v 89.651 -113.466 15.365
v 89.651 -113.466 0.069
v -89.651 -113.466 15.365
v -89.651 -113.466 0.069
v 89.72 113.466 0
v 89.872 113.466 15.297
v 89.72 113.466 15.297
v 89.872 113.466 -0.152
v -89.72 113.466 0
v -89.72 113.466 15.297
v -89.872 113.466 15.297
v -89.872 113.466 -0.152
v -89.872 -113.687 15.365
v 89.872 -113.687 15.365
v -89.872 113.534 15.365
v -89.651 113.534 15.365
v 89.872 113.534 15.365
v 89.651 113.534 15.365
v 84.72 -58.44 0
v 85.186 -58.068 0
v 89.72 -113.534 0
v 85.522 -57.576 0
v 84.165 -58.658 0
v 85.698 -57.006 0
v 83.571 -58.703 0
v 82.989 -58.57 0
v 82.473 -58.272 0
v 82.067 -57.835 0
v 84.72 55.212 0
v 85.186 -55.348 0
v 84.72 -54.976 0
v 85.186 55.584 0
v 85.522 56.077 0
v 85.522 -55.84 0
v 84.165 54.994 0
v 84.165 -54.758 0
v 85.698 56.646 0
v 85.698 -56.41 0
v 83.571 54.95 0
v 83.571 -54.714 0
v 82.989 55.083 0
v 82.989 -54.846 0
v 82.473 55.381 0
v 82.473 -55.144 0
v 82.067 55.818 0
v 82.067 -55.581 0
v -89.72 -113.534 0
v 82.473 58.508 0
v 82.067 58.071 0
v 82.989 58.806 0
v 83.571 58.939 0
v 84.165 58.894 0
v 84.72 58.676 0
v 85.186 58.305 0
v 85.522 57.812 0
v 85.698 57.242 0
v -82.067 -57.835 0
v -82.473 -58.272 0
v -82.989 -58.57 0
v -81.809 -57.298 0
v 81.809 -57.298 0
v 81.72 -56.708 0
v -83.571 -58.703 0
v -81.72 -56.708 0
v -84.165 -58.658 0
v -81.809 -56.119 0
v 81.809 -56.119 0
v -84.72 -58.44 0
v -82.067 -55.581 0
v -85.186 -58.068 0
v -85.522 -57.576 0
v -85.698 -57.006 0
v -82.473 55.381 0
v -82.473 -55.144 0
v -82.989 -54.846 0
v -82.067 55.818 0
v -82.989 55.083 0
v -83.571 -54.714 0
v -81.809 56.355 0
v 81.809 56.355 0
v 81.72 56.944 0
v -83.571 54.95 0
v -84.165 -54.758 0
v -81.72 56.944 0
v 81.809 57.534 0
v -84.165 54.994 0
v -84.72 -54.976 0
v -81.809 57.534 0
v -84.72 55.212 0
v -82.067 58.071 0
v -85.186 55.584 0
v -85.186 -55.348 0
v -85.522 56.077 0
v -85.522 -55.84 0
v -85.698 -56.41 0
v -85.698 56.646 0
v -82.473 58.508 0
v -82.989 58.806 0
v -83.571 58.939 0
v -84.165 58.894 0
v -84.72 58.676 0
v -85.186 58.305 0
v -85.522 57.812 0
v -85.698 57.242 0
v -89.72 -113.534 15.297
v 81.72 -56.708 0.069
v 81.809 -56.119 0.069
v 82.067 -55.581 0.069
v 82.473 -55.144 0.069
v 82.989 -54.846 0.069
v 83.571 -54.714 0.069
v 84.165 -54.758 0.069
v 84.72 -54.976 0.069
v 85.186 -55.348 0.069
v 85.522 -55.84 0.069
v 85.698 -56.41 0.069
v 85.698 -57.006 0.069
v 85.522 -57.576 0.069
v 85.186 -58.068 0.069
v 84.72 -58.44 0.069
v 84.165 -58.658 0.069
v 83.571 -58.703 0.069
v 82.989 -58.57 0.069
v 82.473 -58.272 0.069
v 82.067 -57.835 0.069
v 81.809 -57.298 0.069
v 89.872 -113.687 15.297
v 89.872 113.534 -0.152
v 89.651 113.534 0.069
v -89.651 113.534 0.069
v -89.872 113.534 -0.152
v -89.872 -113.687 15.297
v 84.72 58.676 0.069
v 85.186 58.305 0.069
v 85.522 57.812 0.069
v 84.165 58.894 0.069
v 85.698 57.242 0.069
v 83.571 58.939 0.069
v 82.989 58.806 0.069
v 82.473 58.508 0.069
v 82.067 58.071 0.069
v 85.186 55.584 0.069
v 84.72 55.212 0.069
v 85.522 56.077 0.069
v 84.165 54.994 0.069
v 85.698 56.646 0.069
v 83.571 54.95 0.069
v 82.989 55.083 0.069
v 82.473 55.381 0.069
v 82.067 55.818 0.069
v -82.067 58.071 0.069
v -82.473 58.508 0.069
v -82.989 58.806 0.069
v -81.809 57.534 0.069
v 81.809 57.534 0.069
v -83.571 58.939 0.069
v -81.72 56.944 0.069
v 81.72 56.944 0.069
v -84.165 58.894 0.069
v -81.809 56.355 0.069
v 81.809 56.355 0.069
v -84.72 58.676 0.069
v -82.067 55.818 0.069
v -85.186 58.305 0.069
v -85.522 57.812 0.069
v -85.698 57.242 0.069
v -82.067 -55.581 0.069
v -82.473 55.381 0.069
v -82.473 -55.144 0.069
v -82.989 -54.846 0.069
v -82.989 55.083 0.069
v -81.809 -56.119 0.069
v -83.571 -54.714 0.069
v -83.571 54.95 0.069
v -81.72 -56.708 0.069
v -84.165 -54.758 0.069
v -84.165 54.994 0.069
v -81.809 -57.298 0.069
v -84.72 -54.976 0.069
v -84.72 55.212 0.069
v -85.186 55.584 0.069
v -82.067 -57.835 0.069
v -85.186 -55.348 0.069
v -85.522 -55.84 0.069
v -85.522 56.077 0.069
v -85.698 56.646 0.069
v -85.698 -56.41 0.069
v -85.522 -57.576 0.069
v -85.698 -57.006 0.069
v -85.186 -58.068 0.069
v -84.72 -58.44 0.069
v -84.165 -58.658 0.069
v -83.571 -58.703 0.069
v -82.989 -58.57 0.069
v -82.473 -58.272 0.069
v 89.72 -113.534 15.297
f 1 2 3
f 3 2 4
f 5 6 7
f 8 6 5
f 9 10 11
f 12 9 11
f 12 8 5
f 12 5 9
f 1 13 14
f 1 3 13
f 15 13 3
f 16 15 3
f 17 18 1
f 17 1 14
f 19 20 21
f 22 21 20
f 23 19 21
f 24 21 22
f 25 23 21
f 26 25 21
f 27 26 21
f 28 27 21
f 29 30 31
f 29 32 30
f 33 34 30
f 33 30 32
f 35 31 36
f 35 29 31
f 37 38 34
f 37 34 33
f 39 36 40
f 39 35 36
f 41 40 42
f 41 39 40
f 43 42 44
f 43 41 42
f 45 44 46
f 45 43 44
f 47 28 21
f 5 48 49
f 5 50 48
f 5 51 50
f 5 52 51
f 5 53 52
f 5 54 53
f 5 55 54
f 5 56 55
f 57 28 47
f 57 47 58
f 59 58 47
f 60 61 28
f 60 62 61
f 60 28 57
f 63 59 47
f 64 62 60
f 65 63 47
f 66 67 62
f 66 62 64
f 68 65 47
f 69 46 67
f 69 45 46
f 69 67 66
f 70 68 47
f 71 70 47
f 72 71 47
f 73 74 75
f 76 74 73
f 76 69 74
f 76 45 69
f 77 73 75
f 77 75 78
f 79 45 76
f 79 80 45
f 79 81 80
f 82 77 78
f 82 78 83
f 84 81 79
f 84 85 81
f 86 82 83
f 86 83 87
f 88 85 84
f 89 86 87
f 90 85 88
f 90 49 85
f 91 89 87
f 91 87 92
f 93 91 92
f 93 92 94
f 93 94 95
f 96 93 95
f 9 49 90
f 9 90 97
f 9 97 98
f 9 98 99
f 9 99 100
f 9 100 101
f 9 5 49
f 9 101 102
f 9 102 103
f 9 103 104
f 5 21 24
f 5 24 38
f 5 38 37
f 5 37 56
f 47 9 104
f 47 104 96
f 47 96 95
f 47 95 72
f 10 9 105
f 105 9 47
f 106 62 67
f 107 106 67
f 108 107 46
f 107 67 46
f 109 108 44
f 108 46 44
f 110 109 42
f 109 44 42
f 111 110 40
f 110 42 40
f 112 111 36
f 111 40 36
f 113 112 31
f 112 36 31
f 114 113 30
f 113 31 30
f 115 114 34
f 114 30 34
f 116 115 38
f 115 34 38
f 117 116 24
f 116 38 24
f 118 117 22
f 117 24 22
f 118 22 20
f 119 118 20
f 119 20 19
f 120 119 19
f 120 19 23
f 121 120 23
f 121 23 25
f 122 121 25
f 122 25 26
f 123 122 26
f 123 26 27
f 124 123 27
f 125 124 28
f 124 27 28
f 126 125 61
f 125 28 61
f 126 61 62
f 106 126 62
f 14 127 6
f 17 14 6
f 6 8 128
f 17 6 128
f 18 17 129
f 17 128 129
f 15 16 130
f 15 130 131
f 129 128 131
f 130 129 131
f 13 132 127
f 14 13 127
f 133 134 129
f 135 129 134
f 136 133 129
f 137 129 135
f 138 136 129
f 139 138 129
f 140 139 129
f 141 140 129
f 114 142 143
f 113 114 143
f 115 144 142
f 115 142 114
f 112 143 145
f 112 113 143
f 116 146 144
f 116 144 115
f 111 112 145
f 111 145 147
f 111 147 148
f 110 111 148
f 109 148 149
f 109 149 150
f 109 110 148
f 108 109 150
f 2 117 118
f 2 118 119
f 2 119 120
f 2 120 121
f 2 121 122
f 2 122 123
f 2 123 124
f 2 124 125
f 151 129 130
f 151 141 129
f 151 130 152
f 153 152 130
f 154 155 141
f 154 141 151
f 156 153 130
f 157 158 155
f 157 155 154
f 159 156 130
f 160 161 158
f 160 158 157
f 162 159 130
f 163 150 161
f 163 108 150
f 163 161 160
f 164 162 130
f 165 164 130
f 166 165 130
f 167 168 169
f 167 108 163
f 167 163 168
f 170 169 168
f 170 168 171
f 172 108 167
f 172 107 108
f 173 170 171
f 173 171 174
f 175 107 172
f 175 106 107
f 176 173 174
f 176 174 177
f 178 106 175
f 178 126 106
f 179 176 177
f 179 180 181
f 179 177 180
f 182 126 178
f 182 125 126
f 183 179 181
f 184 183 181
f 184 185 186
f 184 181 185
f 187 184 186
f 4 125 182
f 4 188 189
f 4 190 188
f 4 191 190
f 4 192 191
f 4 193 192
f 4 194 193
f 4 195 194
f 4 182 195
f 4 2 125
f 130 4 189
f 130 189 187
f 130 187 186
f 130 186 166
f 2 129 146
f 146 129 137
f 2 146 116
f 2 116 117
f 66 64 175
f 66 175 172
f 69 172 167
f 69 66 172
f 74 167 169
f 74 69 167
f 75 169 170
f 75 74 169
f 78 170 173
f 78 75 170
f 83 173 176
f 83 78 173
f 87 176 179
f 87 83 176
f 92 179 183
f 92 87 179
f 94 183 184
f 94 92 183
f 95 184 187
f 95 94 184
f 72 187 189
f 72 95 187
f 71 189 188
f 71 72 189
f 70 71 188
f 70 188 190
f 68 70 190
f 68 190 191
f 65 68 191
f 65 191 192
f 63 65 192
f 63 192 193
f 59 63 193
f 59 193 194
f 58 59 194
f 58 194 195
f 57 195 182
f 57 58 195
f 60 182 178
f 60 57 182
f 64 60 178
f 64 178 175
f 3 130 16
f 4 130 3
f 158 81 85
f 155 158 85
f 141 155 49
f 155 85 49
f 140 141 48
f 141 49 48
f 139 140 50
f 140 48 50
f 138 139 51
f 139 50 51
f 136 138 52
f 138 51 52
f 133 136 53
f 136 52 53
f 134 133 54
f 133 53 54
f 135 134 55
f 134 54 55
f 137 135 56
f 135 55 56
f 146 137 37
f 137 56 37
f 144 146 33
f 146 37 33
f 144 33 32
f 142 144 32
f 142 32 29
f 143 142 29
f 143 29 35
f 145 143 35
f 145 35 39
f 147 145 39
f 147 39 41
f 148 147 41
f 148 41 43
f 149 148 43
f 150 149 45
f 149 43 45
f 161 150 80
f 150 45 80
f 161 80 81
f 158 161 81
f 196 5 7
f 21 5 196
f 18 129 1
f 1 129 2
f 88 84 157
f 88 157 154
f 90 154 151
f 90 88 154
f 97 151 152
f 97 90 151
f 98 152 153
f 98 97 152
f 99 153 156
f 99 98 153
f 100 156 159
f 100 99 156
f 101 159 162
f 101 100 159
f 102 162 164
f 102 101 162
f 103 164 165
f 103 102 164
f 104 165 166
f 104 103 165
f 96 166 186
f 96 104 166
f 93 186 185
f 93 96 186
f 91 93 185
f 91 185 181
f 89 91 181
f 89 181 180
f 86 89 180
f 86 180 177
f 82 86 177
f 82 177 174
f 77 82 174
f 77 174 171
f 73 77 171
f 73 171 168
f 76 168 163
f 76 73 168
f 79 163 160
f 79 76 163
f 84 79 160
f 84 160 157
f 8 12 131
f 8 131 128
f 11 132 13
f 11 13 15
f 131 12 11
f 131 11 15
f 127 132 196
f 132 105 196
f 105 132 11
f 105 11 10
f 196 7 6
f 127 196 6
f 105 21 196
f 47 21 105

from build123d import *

# Parameters (mm, degrees)
SKETCH1_W             = 89.6514
SKETCH1_H             = 226.9314
SKETCH1_R             = 2
HEAT_EXCHANGER_DEPTH  = 0.0686
CONVECTION_FINS_DEPTH = 15.29686
TOP_OVERWRAP_DEPTH    = 0.0686
SIDE_OVERWRAP_DEPTH   = 0.0686


with BuildPart() as part:
    # Sketch1 → Heat Exchanger (new body)
    with BuildSketch(Plane.XY):
        with Locations((-44.8257, 0)):
            Rectangle(SKETCH1_W, SKETCH1_H)
        with Locations((-83.71996294, -56.7081132)):
            Circle(SKETCH1_R, mode=Mode.SUBTRACT)
        with Locations((-83.71996294, 56.94427919)):
            Circle(SKETCH1_R, mode=Mode.SUBTRACT)
    heat_exchanger = extrude(amount=HEAT_EXCHANGER_DEPTH)

    # Sketch3 → Convection Fins (add)
    with BuildSketch(Plane.XY):
        Polygon((0, -113.5343), (0, -113.4657), (-89.6514, -113.4657), (-89.6514, 113.4657), (-89.72, 113.4657), (-89.72, -113.5343), align=None)
    convection_fins = extrude(amount=CONVECTION_FINS_DEPTH)

    # Sketch5 → Top Overwrap (add)
    with BuildSketch(Plane(origin=(0, 113.4657, 0), x_dir=(1, 0, 0), z_dir=(0, 1, 0))):
        Polygon((-89.8724, -15.29686), (-89.6514, -15.29686), (-89.6514, -0.0686), (0, -0.0686), (0, 0.1524), (-89.8724, 0.1524), align=None)
    top_overwrap = extrude(amount=TOP_OVERWRAP_DEPTH)

    # Sketch7 → Side Overwrap (add)
    with BuildSketch(Plane.XY.offset(15.29686)):
        Polygon((-89.8724, 113.5343), (-89.6514, 113.5343), (-89.6514, -113.4657), (0, -113.4657), (0, -113.6867), (-89.8724, -113.6867), align=None)
    side_overwrap = extrude(amount=SIDE_OVERWRAP_DEPTH)

    # Mirror1: Heat Exchanger, Convection Fins, Top Overwrap, Side Overwrap across plane
    add(heat_exchanger.mirror(Plane(origin=(0, 0, 0), x_dir=(0, 0, 1), z_dir=(1, 0, 0))))
    add(convection_fins.mirror(Plane(origin=(0, 0, 0), x_dir=(0, 0, 1), z_dir=(1, 0, 0))))
    add(top_overwrap.mirror(Plane(origin=(0, 0, 0), x_dir=(0, 0, 1), z_dir=(1, 0, 0))))
    add(side_overwrap.mirror(Plane(origin=(0, 0, 0), x_dir=(0, 0, 1), z_dir=(1, 0, 0))))


solid = part.part
